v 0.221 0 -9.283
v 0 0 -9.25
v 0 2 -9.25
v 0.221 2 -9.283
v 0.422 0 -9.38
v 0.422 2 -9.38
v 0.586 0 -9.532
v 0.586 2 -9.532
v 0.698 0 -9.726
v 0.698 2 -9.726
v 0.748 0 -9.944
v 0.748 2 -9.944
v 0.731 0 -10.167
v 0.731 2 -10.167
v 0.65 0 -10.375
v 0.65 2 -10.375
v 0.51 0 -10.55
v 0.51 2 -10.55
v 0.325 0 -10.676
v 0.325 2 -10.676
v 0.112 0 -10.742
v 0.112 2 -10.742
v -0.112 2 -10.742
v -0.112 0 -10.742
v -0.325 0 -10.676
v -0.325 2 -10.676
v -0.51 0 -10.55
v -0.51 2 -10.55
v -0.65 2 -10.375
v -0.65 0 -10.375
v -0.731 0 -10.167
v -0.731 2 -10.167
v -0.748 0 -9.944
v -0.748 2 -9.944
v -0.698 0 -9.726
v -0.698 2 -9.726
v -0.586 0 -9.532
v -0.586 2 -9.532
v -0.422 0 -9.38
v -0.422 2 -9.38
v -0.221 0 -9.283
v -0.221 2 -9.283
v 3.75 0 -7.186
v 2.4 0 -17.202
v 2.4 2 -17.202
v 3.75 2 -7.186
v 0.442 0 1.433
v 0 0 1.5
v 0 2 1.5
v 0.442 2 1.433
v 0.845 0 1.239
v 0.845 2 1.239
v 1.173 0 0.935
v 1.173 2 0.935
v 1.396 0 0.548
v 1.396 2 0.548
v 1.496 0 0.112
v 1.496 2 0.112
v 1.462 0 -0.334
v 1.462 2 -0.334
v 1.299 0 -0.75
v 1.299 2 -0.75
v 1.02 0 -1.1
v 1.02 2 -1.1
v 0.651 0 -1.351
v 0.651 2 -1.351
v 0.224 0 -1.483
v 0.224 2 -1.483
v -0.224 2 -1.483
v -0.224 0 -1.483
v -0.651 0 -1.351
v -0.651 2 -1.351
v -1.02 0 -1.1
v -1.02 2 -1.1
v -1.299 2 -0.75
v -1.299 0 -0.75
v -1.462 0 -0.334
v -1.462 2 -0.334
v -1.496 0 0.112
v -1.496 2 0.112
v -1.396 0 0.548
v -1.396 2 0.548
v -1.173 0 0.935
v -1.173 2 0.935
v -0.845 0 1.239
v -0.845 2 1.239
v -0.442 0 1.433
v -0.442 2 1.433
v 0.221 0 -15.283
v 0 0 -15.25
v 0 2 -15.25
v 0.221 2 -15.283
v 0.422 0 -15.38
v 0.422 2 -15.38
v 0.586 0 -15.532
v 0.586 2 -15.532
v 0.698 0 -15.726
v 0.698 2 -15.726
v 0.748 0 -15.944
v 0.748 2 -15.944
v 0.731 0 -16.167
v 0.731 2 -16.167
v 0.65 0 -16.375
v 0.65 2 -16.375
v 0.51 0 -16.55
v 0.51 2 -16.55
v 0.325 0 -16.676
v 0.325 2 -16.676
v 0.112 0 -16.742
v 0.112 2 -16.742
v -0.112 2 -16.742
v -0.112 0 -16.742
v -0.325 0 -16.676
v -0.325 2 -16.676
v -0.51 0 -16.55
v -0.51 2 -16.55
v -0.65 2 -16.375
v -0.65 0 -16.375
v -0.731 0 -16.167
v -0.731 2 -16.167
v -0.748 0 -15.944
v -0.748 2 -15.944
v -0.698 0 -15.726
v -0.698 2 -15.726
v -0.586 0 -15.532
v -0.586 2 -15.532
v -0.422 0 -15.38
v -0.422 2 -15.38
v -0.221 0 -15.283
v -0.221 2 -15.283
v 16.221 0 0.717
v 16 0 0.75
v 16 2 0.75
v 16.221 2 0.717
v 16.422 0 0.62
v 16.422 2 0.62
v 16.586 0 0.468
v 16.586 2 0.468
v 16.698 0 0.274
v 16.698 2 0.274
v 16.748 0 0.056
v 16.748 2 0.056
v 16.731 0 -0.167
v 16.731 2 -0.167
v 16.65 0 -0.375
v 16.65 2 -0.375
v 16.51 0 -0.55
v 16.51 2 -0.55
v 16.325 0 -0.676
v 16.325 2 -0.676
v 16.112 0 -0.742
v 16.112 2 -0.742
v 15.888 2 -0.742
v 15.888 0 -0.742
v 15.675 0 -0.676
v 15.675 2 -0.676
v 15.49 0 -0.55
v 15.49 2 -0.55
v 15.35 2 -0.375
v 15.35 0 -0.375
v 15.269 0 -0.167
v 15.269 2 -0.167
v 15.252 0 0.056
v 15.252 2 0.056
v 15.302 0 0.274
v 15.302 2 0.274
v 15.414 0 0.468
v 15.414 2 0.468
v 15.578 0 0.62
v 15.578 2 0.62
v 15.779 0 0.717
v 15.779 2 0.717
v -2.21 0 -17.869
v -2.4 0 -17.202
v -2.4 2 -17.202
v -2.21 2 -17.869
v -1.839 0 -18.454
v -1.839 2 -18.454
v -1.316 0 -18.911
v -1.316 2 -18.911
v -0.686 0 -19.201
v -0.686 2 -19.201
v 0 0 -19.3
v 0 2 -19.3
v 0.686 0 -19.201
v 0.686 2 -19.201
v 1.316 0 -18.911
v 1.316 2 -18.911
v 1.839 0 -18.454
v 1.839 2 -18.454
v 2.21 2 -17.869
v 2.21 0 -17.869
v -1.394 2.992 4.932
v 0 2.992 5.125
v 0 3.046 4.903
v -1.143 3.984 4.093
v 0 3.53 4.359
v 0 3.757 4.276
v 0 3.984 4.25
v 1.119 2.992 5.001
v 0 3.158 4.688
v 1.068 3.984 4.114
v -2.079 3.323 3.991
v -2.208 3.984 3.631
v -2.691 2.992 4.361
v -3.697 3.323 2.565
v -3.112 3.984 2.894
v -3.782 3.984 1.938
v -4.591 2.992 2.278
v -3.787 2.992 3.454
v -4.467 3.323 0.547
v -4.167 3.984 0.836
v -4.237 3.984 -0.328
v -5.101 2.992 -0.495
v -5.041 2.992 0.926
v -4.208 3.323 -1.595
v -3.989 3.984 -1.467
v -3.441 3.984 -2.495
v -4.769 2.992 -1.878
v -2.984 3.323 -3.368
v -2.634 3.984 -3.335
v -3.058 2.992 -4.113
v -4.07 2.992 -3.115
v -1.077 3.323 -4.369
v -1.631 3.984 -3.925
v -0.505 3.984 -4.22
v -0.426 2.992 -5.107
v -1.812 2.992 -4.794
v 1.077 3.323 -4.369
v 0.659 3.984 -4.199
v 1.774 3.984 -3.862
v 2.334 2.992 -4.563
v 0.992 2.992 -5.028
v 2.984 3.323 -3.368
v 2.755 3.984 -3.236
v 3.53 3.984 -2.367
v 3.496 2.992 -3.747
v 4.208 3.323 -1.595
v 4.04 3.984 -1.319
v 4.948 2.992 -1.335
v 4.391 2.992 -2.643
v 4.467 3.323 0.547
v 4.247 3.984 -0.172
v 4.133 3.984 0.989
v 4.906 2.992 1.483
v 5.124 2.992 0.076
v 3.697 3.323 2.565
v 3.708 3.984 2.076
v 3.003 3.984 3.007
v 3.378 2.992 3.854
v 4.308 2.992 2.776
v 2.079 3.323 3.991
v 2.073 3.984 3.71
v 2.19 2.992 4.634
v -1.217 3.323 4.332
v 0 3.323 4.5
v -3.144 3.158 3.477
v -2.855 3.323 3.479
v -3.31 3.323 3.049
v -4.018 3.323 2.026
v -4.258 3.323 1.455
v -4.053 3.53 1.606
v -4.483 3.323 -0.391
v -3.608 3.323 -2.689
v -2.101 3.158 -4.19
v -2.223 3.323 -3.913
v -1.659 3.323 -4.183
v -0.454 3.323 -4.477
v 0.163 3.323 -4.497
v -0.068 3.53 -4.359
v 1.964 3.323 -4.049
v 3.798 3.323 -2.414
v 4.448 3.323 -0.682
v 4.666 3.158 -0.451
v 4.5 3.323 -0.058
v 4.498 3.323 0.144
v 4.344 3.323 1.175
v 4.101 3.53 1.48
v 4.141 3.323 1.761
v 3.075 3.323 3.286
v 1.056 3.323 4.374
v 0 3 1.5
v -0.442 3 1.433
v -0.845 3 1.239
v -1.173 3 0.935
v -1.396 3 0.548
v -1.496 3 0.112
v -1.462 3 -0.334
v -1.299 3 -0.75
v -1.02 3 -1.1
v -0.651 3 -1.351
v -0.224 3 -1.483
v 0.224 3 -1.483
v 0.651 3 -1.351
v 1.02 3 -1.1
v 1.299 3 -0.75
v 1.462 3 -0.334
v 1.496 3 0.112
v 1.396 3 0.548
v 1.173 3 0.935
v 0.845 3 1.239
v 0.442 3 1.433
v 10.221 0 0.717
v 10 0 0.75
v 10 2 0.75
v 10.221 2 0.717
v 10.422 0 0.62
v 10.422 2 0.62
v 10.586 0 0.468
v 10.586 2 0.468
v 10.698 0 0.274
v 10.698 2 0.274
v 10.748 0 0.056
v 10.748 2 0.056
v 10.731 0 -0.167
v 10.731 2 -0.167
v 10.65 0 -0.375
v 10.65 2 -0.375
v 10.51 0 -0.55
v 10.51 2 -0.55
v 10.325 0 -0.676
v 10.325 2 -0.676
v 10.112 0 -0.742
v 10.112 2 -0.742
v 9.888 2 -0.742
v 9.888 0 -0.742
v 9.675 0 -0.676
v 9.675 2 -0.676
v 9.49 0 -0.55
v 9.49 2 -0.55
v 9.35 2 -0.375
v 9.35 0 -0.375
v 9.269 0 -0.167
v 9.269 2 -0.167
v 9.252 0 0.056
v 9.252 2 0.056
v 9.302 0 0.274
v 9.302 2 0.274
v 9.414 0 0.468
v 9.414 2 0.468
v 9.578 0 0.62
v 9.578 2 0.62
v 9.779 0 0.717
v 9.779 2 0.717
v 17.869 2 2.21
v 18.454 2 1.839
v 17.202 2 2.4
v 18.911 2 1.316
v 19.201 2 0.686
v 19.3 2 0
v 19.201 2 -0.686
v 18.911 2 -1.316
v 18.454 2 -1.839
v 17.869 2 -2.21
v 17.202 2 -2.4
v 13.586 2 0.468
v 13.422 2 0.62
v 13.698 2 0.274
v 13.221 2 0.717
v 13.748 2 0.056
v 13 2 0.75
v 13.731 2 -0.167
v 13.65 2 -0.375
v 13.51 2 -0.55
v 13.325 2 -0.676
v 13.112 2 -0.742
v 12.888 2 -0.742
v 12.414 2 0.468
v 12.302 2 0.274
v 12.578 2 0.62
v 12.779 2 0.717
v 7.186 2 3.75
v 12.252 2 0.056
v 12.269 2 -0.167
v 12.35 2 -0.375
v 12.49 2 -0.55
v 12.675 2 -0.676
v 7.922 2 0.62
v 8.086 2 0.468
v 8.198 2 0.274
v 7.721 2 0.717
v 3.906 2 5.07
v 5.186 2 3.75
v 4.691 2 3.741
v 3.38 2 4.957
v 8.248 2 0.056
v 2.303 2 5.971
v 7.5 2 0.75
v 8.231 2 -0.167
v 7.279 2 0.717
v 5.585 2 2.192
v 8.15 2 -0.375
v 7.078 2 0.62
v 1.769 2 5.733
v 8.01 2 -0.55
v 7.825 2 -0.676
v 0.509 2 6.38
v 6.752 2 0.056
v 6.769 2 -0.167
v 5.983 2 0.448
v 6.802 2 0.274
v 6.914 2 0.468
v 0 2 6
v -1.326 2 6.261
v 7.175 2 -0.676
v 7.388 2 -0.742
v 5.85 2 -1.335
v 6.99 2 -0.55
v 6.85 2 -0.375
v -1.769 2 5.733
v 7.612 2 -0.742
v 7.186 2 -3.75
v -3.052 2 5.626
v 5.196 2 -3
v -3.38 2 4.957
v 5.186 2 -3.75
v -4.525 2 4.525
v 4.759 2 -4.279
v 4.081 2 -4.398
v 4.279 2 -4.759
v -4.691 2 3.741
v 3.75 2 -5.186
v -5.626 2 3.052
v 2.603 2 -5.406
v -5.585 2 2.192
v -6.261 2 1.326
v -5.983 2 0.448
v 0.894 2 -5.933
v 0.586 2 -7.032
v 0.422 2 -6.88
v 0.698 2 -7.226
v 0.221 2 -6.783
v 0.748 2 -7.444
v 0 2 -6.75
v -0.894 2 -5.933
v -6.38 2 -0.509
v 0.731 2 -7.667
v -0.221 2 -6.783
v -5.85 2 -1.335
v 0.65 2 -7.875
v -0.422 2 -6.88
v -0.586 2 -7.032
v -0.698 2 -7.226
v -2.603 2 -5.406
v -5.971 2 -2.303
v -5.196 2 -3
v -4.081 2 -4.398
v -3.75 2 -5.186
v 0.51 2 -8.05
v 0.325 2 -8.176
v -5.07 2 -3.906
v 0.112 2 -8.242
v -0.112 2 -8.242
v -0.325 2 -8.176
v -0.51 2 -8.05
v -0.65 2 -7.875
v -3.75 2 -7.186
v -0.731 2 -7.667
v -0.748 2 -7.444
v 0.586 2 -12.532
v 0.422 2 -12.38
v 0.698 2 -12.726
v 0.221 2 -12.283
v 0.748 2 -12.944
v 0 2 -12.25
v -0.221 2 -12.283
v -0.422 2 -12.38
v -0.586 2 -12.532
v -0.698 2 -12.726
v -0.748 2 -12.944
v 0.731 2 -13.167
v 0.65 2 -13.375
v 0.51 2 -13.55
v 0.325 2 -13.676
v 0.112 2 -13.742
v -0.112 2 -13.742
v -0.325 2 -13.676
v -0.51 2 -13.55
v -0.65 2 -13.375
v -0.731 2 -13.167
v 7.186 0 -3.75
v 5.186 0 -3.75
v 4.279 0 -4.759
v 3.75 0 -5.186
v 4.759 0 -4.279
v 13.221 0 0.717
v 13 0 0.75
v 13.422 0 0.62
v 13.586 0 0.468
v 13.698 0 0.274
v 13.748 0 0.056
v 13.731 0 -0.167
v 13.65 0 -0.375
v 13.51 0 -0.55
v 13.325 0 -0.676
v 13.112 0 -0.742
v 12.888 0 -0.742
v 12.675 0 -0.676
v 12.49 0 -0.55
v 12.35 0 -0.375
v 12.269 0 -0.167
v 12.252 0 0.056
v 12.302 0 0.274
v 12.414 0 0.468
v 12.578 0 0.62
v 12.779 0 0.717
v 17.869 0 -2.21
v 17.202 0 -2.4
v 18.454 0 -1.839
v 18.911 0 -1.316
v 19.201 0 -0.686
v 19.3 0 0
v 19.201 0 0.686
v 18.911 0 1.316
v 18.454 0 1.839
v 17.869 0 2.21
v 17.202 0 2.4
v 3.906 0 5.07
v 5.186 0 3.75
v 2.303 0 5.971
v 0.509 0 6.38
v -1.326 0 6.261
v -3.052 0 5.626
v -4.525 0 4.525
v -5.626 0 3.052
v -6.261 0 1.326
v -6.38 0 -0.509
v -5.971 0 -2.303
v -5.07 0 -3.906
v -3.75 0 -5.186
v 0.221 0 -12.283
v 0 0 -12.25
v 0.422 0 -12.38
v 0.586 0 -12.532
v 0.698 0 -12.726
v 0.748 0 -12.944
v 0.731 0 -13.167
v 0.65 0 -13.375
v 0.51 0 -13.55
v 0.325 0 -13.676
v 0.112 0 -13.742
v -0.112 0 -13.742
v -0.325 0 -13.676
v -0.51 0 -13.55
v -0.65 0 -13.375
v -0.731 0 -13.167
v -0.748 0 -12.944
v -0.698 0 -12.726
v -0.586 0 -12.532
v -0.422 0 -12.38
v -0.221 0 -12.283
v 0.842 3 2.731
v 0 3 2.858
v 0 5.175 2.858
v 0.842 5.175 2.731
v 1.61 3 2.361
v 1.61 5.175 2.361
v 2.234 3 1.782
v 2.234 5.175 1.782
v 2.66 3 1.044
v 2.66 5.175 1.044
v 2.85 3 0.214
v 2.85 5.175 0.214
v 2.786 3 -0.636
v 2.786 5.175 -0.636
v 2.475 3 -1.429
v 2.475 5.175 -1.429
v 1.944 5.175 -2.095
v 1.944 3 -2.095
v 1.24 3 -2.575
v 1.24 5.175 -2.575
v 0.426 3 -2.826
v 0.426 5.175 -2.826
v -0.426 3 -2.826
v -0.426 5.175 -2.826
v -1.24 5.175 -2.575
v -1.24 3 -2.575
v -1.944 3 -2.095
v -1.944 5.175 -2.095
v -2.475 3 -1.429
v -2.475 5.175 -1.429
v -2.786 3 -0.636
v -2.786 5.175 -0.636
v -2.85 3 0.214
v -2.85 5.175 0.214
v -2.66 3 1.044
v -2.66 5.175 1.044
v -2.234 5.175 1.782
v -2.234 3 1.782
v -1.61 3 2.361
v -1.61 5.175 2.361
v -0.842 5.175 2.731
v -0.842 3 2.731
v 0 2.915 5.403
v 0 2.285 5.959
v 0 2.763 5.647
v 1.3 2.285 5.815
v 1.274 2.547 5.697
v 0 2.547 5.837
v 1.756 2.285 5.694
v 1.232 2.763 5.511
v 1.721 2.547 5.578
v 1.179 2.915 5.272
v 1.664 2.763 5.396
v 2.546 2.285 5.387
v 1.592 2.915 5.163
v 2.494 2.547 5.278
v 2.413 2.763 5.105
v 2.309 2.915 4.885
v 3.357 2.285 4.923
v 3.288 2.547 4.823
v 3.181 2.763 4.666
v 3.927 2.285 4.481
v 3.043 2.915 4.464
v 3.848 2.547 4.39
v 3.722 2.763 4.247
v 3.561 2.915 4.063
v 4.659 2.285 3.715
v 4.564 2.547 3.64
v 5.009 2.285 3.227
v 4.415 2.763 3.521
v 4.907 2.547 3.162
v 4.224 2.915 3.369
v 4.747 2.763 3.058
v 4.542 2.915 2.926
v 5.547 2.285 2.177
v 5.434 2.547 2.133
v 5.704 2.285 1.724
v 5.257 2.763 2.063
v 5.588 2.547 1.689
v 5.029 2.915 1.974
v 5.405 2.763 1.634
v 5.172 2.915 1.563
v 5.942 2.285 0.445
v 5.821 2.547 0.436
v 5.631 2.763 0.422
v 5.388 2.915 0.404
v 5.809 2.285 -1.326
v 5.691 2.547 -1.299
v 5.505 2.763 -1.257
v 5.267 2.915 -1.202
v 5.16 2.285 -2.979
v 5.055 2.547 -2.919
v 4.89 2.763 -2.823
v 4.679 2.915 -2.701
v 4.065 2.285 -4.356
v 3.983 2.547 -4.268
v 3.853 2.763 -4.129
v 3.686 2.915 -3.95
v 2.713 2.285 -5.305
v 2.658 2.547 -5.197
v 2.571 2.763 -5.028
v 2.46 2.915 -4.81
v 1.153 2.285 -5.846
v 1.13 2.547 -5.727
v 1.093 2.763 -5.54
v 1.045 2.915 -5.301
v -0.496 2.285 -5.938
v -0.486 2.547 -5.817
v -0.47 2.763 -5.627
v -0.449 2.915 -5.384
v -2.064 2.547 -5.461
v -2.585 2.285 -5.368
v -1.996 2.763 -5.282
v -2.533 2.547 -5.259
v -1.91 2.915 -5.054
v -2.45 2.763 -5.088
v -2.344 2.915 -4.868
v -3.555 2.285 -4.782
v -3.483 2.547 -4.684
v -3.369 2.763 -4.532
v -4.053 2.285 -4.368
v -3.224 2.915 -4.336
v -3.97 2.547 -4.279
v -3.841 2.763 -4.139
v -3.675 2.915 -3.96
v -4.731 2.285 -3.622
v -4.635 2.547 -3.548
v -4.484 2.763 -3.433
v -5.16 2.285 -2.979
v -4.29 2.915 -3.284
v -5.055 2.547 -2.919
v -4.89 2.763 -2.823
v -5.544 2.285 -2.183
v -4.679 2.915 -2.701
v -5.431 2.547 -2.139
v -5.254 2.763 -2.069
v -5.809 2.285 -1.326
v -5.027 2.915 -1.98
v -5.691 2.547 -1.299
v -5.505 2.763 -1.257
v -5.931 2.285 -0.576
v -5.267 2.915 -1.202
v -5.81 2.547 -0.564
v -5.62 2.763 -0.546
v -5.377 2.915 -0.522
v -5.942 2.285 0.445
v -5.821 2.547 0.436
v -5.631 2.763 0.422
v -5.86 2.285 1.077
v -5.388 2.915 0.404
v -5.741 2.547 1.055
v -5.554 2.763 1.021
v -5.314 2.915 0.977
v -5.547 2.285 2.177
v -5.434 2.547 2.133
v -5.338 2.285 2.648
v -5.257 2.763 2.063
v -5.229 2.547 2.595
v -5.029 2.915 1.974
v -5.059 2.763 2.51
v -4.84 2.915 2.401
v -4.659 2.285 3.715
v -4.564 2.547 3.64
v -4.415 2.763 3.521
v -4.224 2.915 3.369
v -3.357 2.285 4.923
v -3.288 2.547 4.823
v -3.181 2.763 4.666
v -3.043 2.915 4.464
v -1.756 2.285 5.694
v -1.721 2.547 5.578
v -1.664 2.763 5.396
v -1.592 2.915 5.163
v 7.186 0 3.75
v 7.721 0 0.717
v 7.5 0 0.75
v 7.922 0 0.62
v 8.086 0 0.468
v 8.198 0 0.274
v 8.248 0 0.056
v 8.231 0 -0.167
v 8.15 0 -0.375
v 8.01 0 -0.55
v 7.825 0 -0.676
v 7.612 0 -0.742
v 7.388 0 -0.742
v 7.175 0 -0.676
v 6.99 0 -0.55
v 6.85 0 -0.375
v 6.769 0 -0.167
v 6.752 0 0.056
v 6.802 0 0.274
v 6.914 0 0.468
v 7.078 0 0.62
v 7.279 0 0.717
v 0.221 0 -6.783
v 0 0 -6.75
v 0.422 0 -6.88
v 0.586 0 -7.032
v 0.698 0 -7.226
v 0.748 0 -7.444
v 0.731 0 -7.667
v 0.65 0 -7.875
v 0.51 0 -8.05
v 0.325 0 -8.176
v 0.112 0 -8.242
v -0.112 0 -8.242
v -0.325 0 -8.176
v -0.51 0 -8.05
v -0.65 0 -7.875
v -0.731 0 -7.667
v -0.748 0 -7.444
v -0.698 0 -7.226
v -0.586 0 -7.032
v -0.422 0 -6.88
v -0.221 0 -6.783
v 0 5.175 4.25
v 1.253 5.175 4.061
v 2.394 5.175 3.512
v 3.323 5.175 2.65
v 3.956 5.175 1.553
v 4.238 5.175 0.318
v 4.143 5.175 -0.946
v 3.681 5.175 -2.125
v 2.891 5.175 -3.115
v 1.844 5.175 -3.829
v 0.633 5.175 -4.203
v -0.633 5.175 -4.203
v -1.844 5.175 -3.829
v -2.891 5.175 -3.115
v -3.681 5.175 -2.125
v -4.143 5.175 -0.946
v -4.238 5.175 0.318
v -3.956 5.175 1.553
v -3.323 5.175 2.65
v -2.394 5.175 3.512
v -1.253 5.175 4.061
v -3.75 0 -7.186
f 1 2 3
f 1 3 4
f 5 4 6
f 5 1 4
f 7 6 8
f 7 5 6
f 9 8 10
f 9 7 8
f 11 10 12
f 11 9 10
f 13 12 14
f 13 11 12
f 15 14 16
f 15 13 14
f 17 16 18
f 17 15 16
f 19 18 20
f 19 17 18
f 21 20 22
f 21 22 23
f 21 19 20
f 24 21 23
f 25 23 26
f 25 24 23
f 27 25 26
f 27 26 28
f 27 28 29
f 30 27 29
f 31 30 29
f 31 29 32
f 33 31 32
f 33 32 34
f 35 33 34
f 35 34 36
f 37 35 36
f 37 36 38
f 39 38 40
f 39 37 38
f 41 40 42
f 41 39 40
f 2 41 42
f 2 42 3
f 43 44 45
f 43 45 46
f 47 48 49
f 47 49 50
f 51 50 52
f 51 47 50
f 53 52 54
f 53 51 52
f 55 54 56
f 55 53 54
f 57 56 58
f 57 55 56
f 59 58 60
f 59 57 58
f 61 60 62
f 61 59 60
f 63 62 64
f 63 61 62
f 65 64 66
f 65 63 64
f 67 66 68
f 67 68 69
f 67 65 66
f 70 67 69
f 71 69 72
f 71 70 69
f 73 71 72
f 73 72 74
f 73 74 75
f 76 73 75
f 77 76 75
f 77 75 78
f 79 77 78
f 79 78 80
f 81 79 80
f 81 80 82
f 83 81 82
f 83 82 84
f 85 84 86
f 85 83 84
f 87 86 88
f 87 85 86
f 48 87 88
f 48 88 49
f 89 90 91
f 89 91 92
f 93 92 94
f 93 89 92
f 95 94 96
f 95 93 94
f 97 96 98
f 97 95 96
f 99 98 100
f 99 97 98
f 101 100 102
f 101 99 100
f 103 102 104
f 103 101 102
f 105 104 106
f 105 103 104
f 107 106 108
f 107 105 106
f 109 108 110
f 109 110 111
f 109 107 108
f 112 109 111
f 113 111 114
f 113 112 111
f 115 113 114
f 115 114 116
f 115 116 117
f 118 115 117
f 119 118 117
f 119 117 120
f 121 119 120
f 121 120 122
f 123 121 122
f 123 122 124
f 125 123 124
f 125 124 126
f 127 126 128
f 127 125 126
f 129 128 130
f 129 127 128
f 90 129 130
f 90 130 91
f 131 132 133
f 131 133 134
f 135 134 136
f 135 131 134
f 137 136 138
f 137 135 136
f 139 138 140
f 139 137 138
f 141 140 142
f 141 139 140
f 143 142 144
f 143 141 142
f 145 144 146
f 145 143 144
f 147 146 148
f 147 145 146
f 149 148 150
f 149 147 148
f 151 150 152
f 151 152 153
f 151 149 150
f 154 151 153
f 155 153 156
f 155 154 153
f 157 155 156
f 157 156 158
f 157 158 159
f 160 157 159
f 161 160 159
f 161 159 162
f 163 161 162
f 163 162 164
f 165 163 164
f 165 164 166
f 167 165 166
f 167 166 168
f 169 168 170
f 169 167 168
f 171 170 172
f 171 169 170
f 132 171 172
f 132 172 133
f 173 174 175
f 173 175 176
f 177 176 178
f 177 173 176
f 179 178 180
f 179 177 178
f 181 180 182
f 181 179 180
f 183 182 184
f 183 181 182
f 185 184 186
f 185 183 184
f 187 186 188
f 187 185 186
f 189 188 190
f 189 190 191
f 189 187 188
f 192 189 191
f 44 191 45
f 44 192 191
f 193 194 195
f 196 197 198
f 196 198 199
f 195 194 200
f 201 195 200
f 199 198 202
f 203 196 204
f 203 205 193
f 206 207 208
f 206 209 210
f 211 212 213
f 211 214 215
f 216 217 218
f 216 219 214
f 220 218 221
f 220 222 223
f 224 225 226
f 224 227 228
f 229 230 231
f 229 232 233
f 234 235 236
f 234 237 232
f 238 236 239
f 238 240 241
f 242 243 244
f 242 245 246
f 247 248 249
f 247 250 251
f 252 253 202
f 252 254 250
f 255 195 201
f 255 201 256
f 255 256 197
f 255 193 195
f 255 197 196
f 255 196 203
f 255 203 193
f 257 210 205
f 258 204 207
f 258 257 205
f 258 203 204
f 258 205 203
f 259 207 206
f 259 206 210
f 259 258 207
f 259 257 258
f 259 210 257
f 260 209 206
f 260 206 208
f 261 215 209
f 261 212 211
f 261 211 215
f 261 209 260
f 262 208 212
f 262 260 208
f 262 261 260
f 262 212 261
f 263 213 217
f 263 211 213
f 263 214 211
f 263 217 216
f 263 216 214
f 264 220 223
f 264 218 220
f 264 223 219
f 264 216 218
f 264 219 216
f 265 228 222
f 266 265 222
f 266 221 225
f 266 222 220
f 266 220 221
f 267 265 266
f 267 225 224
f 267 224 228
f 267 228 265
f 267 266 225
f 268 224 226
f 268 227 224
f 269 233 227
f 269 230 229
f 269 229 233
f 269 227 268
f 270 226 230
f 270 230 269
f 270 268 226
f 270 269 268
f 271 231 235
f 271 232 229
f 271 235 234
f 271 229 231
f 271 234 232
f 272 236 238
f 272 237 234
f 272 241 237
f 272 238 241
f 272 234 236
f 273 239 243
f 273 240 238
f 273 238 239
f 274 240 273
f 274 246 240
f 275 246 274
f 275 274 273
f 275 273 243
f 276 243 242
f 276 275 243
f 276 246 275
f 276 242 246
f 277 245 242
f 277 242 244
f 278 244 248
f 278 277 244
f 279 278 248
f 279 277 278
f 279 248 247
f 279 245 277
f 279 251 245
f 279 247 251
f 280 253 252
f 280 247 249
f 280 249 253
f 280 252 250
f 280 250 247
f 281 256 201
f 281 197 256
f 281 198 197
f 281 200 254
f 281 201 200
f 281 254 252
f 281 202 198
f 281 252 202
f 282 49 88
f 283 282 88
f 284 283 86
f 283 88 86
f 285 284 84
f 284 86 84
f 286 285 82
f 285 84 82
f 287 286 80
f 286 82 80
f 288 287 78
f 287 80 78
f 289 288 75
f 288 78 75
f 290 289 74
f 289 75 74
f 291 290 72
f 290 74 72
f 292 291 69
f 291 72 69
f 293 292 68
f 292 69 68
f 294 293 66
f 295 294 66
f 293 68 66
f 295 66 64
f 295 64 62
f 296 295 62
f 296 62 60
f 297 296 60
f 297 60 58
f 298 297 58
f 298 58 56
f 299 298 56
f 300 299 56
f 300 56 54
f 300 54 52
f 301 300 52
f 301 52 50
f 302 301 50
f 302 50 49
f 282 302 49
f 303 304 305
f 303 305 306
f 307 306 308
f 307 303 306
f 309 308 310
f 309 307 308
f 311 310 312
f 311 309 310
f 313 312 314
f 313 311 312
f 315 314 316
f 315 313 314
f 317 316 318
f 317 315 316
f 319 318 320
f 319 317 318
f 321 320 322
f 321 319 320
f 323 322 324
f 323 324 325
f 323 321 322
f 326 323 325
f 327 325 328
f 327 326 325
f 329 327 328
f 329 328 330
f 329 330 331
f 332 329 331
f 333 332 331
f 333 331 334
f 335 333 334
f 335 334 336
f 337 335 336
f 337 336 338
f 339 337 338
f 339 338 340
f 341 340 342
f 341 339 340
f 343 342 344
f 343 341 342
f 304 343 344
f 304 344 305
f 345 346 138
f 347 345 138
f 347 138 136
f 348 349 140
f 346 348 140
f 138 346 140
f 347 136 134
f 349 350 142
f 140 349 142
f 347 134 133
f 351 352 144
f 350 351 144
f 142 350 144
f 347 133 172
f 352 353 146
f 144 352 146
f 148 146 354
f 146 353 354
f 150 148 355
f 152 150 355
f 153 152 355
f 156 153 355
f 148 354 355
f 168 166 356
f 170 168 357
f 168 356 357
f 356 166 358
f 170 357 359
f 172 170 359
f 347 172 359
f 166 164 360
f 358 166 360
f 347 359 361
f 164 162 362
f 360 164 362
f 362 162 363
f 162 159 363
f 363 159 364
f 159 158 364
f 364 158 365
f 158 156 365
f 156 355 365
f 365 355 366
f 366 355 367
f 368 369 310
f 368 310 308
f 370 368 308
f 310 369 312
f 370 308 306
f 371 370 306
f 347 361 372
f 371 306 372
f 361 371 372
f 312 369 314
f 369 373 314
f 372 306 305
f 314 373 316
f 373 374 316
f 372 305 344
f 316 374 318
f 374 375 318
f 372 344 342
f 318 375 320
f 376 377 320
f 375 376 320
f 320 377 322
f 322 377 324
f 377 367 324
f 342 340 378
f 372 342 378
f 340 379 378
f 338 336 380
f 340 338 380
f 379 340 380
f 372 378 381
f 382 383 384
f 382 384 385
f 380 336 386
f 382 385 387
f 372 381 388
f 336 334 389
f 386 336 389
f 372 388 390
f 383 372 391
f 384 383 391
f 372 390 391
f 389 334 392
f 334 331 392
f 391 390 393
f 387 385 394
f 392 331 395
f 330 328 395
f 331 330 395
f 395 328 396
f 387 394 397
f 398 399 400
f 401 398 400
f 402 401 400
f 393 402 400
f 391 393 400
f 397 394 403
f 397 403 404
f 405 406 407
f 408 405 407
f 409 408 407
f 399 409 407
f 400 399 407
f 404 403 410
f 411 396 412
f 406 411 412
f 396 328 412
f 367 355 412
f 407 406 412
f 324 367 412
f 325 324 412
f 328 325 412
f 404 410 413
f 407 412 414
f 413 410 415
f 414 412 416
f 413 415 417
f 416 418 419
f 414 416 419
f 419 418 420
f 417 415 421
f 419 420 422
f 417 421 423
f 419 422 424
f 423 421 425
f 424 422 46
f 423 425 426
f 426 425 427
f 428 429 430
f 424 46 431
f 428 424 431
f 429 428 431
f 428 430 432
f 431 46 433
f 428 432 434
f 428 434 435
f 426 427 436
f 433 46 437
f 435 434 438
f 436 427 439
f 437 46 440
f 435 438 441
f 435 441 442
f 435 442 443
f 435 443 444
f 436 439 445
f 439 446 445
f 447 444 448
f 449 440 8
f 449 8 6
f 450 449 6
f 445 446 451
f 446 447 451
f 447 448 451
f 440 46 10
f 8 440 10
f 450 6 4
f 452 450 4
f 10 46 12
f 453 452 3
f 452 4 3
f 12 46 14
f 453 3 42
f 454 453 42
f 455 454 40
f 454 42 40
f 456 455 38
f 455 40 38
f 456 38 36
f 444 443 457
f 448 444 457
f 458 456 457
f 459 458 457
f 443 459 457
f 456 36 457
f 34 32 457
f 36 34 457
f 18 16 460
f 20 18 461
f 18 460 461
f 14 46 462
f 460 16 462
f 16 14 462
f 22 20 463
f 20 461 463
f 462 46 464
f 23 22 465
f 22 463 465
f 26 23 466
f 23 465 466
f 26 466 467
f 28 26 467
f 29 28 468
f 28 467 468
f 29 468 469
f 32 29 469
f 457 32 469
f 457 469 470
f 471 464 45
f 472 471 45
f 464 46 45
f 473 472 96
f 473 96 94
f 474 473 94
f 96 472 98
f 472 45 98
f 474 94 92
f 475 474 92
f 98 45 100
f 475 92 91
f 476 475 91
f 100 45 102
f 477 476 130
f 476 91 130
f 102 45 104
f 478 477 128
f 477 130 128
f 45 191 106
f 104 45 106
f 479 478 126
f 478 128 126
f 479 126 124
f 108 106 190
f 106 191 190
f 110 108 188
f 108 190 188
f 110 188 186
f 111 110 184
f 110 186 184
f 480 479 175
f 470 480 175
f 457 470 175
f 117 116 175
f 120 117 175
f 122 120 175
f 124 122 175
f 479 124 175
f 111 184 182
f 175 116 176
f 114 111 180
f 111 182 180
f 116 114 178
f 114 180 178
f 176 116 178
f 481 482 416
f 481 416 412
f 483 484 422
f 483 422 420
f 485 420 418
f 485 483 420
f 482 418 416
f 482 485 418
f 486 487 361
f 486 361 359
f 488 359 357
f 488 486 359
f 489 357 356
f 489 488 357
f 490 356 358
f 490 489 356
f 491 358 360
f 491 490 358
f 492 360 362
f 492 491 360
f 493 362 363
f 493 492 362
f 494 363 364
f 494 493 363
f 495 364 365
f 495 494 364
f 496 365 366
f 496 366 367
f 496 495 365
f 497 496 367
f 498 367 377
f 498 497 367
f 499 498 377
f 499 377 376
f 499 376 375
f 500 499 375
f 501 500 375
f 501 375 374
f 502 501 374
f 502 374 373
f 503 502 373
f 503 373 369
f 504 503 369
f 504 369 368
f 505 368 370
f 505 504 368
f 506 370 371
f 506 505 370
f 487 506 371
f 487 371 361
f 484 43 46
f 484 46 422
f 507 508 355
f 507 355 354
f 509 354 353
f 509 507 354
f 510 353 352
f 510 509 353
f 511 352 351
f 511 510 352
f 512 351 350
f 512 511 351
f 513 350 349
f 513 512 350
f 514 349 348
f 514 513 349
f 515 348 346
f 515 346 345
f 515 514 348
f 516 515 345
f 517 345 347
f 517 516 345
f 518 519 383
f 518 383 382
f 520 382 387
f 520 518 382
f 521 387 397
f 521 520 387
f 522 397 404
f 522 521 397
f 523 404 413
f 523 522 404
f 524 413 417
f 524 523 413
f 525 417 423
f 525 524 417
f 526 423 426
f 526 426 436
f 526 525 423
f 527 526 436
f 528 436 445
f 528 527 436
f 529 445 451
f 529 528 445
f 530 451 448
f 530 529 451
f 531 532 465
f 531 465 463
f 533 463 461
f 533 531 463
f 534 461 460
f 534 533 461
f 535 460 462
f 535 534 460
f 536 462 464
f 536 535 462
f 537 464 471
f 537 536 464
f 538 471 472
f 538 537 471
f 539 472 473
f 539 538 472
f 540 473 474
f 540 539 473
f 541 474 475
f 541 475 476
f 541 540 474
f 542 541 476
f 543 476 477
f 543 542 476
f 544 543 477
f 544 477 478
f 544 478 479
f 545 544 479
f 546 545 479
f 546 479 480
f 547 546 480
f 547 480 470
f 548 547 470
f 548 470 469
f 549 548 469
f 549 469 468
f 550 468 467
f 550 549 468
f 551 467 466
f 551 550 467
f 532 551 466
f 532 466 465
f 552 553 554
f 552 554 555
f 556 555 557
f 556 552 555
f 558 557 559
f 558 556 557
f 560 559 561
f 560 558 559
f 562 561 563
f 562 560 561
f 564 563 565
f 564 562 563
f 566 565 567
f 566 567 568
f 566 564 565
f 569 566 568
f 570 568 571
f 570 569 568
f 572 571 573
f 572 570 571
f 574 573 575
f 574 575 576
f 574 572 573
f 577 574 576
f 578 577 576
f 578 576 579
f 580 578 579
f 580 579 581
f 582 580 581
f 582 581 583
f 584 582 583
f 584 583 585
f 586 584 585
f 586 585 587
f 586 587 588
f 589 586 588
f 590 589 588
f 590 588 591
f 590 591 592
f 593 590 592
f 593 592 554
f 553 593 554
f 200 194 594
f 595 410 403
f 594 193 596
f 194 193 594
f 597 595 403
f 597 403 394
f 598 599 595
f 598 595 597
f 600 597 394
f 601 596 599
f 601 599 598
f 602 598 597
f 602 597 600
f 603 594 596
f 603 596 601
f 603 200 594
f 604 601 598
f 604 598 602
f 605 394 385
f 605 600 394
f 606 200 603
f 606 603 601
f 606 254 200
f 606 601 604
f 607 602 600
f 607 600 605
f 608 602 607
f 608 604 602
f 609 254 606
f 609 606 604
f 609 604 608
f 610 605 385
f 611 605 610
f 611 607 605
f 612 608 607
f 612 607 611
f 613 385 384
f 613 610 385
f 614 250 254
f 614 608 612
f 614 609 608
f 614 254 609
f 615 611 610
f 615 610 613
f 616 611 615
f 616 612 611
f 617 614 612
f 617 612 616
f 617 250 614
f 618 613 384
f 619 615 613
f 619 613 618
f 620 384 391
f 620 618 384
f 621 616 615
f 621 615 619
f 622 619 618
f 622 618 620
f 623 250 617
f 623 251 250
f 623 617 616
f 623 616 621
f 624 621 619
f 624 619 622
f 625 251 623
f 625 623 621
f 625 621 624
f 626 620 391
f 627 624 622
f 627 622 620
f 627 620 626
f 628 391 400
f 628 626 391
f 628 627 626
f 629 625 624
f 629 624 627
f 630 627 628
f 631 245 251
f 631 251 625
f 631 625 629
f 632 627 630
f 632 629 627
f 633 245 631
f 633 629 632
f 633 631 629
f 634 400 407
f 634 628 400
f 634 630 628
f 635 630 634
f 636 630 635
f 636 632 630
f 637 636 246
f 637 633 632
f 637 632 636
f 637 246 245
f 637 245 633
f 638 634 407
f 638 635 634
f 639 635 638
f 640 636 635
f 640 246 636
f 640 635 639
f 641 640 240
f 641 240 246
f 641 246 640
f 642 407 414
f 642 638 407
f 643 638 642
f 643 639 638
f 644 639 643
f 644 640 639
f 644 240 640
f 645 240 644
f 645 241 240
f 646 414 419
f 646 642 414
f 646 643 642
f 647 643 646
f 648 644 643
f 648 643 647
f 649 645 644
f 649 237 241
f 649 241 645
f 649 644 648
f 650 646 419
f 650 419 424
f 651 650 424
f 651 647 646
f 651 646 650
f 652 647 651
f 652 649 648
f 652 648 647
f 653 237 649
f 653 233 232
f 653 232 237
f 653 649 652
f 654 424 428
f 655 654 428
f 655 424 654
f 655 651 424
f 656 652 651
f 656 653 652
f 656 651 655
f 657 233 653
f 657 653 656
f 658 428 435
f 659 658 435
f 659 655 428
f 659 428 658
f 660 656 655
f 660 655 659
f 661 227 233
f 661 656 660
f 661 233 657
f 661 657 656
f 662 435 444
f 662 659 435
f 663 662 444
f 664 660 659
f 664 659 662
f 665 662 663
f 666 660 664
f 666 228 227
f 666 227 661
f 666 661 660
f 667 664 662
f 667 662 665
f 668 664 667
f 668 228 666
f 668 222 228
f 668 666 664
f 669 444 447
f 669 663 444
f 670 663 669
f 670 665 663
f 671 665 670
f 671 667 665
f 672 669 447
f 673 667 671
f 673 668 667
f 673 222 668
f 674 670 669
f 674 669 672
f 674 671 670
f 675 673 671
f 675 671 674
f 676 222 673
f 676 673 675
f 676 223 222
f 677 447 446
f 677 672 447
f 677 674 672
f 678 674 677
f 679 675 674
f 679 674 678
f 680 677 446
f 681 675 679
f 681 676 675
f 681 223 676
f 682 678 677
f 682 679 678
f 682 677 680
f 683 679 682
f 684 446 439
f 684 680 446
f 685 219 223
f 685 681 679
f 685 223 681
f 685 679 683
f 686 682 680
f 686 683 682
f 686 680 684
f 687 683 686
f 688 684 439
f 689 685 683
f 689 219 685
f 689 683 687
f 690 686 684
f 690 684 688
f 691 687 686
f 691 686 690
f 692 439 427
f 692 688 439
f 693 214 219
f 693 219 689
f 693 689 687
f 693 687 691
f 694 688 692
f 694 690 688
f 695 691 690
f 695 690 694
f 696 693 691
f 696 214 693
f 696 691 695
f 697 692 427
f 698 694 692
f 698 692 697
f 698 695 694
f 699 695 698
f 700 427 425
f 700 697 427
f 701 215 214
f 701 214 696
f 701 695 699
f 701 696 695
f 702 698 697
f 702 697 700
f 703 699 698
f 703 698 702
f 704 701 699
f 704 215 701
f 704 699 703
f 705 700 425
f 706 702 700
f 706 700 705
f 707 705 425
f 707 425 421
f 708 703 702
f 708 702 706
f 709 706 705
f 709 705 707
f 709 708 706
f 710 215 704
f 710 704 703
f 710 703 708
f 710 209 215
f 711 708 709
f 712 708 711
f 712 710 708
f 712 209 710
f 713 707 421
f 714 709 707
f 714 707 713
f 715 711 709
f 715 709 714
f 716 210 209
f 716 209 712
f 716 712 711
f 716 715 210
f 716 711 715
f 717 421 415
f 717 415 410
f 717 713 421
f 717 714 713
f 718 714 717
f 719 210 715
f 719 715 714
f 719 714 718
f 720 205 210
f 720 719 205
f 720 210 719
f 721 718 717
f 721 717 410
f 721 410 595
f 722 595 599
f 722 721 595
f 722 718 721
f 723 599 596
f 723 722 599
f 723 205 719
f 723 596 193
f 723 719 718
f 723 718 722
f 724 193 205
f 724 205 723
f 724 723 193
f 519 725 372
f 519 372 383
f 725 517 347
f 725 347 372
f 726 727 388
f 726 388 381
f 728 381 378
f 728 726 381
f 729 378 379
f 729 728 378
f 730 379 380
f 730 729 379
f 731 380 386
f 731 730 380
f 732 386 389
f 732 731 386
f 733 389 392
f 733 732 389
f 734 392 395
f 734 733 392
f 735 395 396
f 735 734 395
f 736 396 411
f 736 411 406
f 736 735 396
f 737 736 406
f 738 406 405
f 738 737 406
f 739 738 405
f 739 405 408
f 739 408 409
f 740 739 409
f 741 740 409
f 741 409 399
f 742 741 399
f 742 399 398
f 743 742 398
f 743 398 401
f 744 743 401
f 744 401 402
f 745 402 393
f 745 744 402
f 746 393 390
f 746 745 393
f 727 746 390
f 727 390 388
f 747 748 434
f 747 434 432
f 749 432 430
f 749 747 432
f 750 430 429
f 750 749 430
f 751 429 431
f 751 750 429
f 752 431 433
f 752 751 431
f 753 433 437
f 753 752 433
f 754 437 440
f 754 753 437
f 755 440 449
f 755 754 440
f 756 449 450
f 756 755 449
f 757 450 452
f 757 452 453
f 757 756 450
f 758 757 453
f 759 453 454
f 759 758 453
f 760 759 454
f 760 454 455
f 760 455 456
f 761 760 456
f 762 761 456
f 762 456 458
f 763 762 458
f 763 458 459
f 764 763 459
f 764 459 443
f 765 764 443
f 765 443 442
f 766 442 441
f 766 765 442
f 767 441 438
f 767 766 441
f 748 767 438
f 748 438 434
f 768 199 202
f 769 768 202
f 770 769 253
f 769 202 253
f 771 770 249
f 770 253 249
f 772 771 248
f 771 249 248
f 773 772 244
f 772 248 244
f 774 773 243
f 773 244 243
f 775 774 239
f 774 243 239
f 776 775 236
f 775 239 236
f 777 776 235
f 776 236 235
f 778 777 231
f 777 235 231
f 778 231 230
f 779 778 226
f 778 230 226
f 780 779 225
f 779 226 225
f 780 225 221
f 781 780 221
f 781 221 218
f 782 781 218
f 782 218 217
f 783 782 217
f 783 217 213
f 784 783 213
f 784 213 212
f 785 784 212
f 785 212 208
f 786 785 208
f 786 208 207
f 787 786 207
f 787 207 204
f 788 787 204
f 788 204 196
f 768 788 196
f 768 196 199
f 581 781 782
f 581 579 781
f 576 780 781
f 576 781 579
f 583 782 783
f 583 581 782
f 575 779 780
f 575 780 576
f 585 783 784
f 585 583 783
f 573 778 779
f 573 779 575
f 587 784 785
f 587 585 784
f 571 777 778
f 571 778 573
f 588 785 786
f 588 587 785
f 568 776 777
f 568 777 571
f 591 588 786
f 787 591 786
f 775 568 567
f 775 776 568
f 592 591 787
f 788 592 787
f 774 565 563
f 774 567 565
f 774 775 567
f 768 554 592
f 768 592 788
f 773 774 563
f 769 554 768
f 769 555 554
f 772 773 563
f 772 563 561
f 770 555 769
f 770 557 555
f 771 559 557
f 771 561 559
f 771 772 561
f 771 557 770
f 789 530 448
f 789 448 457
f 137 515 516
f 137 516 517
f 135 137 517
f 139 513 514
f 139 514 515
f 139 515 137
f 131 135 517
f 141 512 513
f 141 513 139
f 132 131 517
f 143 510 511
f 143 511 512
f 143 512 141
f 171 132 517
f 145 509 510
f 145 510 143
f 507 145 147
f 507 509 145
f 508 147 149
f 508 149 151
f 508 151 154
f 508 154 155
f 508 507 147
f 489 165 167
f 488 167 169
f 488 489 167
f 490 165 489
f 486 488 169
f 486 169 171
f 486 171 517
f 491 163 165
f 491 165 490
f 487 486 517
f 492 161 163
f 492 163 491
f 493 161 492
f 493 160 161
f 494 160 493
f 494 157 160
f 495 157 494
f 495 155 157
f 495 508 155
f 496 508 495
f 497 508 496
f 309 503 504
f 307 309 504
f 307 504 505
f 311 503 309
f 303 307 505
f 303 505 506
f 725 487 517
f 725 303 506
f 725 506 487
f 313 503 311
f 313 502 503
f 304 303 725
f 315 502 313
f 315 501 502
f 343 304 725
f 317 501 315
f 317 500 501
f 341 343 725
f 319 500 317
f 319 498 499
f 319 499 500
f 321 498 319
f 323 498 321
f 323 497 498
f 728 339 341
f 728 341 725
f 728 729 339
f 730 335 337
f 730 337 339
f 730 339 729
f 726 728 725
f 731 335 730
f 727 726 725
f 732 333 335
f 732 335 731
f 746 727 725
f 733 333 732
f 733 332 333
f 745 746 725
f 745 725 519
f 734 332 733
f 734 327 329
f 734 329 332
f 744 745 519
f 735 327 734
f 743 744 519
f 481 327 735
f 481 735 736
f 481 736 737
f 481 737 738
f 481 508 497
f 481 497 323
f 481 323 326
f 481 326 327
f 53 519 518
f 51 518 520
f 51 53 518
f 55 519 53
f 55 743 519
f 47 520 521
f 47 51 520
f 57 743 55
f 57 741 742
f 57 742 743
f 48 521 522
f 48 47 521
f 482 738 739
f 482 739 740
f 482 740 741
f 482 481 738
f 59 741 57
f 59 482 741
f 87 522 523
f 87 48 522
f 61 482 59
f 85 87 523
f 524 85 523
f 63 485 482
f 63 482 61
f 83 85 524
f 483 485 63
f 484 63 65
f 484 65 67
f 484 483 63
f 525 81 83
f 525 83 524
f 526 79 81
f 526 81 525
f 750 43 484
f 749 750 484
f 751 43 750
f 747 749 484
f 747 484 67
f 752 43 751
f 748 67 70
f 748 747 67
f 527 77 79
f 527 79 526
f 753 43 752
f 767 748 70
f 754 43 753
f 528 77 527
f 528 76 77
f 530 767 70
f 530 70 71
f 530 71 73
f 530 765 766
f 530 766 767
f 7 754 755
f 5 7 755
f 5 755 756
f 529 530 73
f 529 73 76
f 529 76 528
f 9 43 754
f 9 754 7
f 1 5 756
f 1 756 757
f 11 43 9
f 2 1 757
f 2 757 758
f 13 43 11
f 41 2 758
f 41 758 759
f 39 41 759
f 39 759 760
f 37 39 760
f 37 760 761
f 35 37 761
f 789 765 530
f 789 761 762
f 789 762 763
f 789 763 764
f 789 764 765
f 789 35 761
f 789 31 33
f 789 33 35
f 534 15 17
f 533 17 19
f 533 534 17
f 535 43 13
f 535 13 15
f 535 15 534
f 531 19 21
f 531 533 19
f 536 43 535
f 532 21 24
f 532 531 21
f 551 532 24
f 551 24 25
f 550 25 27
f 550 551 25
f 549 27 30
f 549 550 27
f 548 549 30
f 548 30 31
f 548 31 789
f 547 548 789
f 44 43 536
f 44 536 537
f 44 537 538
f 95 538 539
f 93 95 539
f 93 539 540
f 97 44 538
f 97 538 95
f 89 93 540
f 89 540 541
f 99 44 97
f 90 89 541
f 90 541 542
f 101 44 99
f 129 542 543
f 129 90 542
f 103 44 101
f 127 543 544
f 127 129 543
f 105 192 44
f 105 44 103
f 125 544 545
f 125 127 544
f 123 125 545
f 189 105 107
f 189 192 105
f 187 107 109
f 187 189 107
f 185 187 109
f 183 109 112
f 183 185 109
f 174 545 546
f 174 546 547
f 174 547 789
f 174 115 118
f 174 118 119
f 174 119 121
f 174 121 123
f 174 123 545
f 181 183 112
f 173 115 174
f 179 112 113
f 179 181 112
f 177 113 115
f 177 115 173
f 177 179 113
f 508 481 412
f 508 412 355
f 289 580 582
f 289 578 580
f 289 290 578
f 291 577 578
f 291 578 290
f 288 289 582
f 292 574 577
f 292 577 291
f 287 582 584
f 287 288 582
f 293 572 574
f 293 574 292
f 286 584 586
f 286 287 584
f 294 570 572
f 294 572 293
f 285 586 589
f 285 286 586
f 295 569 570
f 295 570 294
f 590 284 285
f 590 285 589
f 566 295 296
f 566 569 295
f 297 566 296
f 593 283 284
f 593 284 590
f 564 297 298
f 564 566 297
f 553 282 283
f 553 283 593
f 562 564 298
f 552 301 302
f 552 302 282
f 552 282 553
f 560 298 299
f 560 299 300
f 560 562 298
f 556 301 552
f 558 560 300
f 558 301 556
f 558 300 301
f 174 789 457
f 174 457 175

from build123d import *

# Parameters (mm, degrees)
SKETCH1_R           = 1.5
SKETCH1_R_2         = 0.75
BOSS_EXTRUDE1_DEPTH = 2
SKETCH4_R           = 4.25
SKETCH4_R_2         = 2.8575
BOSS_EXTRUDE2_DEPTH = 3.175
SKETCH5_R           = 6
BOSS_EXTRUDE3_DEPTH = 1
FILLET1_R           = 1
FILLET2_R           = 1
SKETCH7_R           = 1.5
CUT_EXTRUDE1_DEPTH  = 28.780580016


with BuildPart() as part:
    # Sketch1 → Boss-Extrude1 (new body)
    with BuildSketch(Plane(origin=(0, 0, 0), x_dir=(1, 0, 0), z_dir=(0, 1, 0))):
        with BuildLine():
            Line((-3.75, 5.186279977), (-3.75, 7.186279977))
            Line((-3.75, 7.186279977), (-2.4, 17.201793966))
            ThreePointArc((-2.4, 17.201793966), (0, 19.3), (2.4, 17.201793966))
            Line((2.4, 17.201793966), (3.75, 7.186279977))
            Line((3.75, 7.186279977), (3.75, 5.186279977))
            ThreePointArc((3.75, 5.186279977), (4.5254834, 4.5254834), (5.186279977, 3.75))
            Line((5.186279977, 3.75), (7.186279977, 3.75))
            Line((7.186279977, 3.75), (17.201793966, 2.4))
            ThreePointArc((17.201793966, 2.4), (19.3, 0), (17.201793966, -2.4))
            Line((17.201793966, -2.4), (7.186279977, -3.75))
            Line((7.186279977, -3.75), (5.186279977, -3.75))
            ThreePointArc((5.186279977, -3.75), (-4.5254834, -4.5254834), (-3.75, 5.186279977))
        make_face()
        with Locations(Location((0, 0, 0), (0, 0, 270))):
            Circle(SKETCH1_R, mode=Mode.SUBTRACT)
        with Locations(Location((0, 16, 0), (0, 0, 270))):
            Circle(SKETCH1_R_2, mode=Mode.SUBTRACT)
        with Locations(Location((0, 13, 0), (0, 0, 270))):
            Circle(SKETCH1_R_2, mode=Mode.SUBTRACT)
        with Locations(Location((0, 10, 0), (0, 0, 270))):
            Circle(SKETCH1_R_2, mode=Mode.SUBTRACT)
        with Locations(Location((0, 7.5, 0), (0, 0, 270))):
            Circle(SKETCH1_R_2, mode=Mode.SUBTRACT)
        with Locations(Location((7.5, 0, 0), (0, 0, 270))):
            Circle(SKETCH1_R_2, mode=Mode.SUBTRACT)
        with Locations(Location((10, 0, 0), (0, 0, 270))):
            Circle(SKETCH1_R_2, mode=Mode.SUBTRACT)
        with Locations(Location((13, 0, 0), (0, 0, 270))):
            Circle(SKETCH1_R_2, mode=Mode.SUBTRACT)
        with Locations(Location((16, 0, 0), (0, 0, 270))):
            Circle(SKETCH1_R_2, mode=Mode.SUBTRACT)
    extrude(amount=BOSS_EXTRUDE1_DEPTH)

    # Sketch4 → Boss-Extrude2 (add)
    with BuildSketch(Plane(origin=(0, 2, 0), x_dir=(1, 0, 0), z_dir=(0, 1, 0))):
        with Locations(Location((0, 0, 0), (0, 0, 270))):
            Circle(SKETCH4_R)
        with Locations(Location((0, 0, 0), (0, 0, 270))):
            Circle(SKETCH4_R_2, mode=Mode.SUBTRACT)
    extrude(amount=BOSS_EXTRUDE2_DEPTH)

    # Sketch5 → Boss-Extrude3 (add)
    with BuildSketch(Plane(origin=(0, 2, 0), x_dir=(1, 0, 0), z_dir=(0, 1, 0))):
        with Locations(Location((0, 0, 0), (0, 0, 270))):
            Circle(SKETCH5_R)
    extrude(amount=BOSS_EXTRUDE3_DEPTH)

    # Fillet1
    fillet1_edges = [part.edges().sort_by_distance(p)[0] for p in [
        (0, 3, -6),
    ]]
    fillet(fillet1_edges, radius=FILLET1_R - 0.0001)  # a hair under: the kernel refuses the full size

    # Fillet2
    fillet2_edges = [part.edges().sort_by_distance(p)[0] for p in [
        (0, 3, -4.25),
    ]]
    fillet(fillet2_edges, radius=FILLET2_R)

    # Sketch7 → Cut-Extrude1 (cut, through all)
    with BuildSketch(Plane.XZ):
        with Locations(Location((0, 0, 0), (0, 0, 90))):
            Circle(SKETCH7_R)
    extrude(amount=-CUT_EXTRUDE1_DEPTH, mode=Mode.SUBTRACT)


solid = part.part
